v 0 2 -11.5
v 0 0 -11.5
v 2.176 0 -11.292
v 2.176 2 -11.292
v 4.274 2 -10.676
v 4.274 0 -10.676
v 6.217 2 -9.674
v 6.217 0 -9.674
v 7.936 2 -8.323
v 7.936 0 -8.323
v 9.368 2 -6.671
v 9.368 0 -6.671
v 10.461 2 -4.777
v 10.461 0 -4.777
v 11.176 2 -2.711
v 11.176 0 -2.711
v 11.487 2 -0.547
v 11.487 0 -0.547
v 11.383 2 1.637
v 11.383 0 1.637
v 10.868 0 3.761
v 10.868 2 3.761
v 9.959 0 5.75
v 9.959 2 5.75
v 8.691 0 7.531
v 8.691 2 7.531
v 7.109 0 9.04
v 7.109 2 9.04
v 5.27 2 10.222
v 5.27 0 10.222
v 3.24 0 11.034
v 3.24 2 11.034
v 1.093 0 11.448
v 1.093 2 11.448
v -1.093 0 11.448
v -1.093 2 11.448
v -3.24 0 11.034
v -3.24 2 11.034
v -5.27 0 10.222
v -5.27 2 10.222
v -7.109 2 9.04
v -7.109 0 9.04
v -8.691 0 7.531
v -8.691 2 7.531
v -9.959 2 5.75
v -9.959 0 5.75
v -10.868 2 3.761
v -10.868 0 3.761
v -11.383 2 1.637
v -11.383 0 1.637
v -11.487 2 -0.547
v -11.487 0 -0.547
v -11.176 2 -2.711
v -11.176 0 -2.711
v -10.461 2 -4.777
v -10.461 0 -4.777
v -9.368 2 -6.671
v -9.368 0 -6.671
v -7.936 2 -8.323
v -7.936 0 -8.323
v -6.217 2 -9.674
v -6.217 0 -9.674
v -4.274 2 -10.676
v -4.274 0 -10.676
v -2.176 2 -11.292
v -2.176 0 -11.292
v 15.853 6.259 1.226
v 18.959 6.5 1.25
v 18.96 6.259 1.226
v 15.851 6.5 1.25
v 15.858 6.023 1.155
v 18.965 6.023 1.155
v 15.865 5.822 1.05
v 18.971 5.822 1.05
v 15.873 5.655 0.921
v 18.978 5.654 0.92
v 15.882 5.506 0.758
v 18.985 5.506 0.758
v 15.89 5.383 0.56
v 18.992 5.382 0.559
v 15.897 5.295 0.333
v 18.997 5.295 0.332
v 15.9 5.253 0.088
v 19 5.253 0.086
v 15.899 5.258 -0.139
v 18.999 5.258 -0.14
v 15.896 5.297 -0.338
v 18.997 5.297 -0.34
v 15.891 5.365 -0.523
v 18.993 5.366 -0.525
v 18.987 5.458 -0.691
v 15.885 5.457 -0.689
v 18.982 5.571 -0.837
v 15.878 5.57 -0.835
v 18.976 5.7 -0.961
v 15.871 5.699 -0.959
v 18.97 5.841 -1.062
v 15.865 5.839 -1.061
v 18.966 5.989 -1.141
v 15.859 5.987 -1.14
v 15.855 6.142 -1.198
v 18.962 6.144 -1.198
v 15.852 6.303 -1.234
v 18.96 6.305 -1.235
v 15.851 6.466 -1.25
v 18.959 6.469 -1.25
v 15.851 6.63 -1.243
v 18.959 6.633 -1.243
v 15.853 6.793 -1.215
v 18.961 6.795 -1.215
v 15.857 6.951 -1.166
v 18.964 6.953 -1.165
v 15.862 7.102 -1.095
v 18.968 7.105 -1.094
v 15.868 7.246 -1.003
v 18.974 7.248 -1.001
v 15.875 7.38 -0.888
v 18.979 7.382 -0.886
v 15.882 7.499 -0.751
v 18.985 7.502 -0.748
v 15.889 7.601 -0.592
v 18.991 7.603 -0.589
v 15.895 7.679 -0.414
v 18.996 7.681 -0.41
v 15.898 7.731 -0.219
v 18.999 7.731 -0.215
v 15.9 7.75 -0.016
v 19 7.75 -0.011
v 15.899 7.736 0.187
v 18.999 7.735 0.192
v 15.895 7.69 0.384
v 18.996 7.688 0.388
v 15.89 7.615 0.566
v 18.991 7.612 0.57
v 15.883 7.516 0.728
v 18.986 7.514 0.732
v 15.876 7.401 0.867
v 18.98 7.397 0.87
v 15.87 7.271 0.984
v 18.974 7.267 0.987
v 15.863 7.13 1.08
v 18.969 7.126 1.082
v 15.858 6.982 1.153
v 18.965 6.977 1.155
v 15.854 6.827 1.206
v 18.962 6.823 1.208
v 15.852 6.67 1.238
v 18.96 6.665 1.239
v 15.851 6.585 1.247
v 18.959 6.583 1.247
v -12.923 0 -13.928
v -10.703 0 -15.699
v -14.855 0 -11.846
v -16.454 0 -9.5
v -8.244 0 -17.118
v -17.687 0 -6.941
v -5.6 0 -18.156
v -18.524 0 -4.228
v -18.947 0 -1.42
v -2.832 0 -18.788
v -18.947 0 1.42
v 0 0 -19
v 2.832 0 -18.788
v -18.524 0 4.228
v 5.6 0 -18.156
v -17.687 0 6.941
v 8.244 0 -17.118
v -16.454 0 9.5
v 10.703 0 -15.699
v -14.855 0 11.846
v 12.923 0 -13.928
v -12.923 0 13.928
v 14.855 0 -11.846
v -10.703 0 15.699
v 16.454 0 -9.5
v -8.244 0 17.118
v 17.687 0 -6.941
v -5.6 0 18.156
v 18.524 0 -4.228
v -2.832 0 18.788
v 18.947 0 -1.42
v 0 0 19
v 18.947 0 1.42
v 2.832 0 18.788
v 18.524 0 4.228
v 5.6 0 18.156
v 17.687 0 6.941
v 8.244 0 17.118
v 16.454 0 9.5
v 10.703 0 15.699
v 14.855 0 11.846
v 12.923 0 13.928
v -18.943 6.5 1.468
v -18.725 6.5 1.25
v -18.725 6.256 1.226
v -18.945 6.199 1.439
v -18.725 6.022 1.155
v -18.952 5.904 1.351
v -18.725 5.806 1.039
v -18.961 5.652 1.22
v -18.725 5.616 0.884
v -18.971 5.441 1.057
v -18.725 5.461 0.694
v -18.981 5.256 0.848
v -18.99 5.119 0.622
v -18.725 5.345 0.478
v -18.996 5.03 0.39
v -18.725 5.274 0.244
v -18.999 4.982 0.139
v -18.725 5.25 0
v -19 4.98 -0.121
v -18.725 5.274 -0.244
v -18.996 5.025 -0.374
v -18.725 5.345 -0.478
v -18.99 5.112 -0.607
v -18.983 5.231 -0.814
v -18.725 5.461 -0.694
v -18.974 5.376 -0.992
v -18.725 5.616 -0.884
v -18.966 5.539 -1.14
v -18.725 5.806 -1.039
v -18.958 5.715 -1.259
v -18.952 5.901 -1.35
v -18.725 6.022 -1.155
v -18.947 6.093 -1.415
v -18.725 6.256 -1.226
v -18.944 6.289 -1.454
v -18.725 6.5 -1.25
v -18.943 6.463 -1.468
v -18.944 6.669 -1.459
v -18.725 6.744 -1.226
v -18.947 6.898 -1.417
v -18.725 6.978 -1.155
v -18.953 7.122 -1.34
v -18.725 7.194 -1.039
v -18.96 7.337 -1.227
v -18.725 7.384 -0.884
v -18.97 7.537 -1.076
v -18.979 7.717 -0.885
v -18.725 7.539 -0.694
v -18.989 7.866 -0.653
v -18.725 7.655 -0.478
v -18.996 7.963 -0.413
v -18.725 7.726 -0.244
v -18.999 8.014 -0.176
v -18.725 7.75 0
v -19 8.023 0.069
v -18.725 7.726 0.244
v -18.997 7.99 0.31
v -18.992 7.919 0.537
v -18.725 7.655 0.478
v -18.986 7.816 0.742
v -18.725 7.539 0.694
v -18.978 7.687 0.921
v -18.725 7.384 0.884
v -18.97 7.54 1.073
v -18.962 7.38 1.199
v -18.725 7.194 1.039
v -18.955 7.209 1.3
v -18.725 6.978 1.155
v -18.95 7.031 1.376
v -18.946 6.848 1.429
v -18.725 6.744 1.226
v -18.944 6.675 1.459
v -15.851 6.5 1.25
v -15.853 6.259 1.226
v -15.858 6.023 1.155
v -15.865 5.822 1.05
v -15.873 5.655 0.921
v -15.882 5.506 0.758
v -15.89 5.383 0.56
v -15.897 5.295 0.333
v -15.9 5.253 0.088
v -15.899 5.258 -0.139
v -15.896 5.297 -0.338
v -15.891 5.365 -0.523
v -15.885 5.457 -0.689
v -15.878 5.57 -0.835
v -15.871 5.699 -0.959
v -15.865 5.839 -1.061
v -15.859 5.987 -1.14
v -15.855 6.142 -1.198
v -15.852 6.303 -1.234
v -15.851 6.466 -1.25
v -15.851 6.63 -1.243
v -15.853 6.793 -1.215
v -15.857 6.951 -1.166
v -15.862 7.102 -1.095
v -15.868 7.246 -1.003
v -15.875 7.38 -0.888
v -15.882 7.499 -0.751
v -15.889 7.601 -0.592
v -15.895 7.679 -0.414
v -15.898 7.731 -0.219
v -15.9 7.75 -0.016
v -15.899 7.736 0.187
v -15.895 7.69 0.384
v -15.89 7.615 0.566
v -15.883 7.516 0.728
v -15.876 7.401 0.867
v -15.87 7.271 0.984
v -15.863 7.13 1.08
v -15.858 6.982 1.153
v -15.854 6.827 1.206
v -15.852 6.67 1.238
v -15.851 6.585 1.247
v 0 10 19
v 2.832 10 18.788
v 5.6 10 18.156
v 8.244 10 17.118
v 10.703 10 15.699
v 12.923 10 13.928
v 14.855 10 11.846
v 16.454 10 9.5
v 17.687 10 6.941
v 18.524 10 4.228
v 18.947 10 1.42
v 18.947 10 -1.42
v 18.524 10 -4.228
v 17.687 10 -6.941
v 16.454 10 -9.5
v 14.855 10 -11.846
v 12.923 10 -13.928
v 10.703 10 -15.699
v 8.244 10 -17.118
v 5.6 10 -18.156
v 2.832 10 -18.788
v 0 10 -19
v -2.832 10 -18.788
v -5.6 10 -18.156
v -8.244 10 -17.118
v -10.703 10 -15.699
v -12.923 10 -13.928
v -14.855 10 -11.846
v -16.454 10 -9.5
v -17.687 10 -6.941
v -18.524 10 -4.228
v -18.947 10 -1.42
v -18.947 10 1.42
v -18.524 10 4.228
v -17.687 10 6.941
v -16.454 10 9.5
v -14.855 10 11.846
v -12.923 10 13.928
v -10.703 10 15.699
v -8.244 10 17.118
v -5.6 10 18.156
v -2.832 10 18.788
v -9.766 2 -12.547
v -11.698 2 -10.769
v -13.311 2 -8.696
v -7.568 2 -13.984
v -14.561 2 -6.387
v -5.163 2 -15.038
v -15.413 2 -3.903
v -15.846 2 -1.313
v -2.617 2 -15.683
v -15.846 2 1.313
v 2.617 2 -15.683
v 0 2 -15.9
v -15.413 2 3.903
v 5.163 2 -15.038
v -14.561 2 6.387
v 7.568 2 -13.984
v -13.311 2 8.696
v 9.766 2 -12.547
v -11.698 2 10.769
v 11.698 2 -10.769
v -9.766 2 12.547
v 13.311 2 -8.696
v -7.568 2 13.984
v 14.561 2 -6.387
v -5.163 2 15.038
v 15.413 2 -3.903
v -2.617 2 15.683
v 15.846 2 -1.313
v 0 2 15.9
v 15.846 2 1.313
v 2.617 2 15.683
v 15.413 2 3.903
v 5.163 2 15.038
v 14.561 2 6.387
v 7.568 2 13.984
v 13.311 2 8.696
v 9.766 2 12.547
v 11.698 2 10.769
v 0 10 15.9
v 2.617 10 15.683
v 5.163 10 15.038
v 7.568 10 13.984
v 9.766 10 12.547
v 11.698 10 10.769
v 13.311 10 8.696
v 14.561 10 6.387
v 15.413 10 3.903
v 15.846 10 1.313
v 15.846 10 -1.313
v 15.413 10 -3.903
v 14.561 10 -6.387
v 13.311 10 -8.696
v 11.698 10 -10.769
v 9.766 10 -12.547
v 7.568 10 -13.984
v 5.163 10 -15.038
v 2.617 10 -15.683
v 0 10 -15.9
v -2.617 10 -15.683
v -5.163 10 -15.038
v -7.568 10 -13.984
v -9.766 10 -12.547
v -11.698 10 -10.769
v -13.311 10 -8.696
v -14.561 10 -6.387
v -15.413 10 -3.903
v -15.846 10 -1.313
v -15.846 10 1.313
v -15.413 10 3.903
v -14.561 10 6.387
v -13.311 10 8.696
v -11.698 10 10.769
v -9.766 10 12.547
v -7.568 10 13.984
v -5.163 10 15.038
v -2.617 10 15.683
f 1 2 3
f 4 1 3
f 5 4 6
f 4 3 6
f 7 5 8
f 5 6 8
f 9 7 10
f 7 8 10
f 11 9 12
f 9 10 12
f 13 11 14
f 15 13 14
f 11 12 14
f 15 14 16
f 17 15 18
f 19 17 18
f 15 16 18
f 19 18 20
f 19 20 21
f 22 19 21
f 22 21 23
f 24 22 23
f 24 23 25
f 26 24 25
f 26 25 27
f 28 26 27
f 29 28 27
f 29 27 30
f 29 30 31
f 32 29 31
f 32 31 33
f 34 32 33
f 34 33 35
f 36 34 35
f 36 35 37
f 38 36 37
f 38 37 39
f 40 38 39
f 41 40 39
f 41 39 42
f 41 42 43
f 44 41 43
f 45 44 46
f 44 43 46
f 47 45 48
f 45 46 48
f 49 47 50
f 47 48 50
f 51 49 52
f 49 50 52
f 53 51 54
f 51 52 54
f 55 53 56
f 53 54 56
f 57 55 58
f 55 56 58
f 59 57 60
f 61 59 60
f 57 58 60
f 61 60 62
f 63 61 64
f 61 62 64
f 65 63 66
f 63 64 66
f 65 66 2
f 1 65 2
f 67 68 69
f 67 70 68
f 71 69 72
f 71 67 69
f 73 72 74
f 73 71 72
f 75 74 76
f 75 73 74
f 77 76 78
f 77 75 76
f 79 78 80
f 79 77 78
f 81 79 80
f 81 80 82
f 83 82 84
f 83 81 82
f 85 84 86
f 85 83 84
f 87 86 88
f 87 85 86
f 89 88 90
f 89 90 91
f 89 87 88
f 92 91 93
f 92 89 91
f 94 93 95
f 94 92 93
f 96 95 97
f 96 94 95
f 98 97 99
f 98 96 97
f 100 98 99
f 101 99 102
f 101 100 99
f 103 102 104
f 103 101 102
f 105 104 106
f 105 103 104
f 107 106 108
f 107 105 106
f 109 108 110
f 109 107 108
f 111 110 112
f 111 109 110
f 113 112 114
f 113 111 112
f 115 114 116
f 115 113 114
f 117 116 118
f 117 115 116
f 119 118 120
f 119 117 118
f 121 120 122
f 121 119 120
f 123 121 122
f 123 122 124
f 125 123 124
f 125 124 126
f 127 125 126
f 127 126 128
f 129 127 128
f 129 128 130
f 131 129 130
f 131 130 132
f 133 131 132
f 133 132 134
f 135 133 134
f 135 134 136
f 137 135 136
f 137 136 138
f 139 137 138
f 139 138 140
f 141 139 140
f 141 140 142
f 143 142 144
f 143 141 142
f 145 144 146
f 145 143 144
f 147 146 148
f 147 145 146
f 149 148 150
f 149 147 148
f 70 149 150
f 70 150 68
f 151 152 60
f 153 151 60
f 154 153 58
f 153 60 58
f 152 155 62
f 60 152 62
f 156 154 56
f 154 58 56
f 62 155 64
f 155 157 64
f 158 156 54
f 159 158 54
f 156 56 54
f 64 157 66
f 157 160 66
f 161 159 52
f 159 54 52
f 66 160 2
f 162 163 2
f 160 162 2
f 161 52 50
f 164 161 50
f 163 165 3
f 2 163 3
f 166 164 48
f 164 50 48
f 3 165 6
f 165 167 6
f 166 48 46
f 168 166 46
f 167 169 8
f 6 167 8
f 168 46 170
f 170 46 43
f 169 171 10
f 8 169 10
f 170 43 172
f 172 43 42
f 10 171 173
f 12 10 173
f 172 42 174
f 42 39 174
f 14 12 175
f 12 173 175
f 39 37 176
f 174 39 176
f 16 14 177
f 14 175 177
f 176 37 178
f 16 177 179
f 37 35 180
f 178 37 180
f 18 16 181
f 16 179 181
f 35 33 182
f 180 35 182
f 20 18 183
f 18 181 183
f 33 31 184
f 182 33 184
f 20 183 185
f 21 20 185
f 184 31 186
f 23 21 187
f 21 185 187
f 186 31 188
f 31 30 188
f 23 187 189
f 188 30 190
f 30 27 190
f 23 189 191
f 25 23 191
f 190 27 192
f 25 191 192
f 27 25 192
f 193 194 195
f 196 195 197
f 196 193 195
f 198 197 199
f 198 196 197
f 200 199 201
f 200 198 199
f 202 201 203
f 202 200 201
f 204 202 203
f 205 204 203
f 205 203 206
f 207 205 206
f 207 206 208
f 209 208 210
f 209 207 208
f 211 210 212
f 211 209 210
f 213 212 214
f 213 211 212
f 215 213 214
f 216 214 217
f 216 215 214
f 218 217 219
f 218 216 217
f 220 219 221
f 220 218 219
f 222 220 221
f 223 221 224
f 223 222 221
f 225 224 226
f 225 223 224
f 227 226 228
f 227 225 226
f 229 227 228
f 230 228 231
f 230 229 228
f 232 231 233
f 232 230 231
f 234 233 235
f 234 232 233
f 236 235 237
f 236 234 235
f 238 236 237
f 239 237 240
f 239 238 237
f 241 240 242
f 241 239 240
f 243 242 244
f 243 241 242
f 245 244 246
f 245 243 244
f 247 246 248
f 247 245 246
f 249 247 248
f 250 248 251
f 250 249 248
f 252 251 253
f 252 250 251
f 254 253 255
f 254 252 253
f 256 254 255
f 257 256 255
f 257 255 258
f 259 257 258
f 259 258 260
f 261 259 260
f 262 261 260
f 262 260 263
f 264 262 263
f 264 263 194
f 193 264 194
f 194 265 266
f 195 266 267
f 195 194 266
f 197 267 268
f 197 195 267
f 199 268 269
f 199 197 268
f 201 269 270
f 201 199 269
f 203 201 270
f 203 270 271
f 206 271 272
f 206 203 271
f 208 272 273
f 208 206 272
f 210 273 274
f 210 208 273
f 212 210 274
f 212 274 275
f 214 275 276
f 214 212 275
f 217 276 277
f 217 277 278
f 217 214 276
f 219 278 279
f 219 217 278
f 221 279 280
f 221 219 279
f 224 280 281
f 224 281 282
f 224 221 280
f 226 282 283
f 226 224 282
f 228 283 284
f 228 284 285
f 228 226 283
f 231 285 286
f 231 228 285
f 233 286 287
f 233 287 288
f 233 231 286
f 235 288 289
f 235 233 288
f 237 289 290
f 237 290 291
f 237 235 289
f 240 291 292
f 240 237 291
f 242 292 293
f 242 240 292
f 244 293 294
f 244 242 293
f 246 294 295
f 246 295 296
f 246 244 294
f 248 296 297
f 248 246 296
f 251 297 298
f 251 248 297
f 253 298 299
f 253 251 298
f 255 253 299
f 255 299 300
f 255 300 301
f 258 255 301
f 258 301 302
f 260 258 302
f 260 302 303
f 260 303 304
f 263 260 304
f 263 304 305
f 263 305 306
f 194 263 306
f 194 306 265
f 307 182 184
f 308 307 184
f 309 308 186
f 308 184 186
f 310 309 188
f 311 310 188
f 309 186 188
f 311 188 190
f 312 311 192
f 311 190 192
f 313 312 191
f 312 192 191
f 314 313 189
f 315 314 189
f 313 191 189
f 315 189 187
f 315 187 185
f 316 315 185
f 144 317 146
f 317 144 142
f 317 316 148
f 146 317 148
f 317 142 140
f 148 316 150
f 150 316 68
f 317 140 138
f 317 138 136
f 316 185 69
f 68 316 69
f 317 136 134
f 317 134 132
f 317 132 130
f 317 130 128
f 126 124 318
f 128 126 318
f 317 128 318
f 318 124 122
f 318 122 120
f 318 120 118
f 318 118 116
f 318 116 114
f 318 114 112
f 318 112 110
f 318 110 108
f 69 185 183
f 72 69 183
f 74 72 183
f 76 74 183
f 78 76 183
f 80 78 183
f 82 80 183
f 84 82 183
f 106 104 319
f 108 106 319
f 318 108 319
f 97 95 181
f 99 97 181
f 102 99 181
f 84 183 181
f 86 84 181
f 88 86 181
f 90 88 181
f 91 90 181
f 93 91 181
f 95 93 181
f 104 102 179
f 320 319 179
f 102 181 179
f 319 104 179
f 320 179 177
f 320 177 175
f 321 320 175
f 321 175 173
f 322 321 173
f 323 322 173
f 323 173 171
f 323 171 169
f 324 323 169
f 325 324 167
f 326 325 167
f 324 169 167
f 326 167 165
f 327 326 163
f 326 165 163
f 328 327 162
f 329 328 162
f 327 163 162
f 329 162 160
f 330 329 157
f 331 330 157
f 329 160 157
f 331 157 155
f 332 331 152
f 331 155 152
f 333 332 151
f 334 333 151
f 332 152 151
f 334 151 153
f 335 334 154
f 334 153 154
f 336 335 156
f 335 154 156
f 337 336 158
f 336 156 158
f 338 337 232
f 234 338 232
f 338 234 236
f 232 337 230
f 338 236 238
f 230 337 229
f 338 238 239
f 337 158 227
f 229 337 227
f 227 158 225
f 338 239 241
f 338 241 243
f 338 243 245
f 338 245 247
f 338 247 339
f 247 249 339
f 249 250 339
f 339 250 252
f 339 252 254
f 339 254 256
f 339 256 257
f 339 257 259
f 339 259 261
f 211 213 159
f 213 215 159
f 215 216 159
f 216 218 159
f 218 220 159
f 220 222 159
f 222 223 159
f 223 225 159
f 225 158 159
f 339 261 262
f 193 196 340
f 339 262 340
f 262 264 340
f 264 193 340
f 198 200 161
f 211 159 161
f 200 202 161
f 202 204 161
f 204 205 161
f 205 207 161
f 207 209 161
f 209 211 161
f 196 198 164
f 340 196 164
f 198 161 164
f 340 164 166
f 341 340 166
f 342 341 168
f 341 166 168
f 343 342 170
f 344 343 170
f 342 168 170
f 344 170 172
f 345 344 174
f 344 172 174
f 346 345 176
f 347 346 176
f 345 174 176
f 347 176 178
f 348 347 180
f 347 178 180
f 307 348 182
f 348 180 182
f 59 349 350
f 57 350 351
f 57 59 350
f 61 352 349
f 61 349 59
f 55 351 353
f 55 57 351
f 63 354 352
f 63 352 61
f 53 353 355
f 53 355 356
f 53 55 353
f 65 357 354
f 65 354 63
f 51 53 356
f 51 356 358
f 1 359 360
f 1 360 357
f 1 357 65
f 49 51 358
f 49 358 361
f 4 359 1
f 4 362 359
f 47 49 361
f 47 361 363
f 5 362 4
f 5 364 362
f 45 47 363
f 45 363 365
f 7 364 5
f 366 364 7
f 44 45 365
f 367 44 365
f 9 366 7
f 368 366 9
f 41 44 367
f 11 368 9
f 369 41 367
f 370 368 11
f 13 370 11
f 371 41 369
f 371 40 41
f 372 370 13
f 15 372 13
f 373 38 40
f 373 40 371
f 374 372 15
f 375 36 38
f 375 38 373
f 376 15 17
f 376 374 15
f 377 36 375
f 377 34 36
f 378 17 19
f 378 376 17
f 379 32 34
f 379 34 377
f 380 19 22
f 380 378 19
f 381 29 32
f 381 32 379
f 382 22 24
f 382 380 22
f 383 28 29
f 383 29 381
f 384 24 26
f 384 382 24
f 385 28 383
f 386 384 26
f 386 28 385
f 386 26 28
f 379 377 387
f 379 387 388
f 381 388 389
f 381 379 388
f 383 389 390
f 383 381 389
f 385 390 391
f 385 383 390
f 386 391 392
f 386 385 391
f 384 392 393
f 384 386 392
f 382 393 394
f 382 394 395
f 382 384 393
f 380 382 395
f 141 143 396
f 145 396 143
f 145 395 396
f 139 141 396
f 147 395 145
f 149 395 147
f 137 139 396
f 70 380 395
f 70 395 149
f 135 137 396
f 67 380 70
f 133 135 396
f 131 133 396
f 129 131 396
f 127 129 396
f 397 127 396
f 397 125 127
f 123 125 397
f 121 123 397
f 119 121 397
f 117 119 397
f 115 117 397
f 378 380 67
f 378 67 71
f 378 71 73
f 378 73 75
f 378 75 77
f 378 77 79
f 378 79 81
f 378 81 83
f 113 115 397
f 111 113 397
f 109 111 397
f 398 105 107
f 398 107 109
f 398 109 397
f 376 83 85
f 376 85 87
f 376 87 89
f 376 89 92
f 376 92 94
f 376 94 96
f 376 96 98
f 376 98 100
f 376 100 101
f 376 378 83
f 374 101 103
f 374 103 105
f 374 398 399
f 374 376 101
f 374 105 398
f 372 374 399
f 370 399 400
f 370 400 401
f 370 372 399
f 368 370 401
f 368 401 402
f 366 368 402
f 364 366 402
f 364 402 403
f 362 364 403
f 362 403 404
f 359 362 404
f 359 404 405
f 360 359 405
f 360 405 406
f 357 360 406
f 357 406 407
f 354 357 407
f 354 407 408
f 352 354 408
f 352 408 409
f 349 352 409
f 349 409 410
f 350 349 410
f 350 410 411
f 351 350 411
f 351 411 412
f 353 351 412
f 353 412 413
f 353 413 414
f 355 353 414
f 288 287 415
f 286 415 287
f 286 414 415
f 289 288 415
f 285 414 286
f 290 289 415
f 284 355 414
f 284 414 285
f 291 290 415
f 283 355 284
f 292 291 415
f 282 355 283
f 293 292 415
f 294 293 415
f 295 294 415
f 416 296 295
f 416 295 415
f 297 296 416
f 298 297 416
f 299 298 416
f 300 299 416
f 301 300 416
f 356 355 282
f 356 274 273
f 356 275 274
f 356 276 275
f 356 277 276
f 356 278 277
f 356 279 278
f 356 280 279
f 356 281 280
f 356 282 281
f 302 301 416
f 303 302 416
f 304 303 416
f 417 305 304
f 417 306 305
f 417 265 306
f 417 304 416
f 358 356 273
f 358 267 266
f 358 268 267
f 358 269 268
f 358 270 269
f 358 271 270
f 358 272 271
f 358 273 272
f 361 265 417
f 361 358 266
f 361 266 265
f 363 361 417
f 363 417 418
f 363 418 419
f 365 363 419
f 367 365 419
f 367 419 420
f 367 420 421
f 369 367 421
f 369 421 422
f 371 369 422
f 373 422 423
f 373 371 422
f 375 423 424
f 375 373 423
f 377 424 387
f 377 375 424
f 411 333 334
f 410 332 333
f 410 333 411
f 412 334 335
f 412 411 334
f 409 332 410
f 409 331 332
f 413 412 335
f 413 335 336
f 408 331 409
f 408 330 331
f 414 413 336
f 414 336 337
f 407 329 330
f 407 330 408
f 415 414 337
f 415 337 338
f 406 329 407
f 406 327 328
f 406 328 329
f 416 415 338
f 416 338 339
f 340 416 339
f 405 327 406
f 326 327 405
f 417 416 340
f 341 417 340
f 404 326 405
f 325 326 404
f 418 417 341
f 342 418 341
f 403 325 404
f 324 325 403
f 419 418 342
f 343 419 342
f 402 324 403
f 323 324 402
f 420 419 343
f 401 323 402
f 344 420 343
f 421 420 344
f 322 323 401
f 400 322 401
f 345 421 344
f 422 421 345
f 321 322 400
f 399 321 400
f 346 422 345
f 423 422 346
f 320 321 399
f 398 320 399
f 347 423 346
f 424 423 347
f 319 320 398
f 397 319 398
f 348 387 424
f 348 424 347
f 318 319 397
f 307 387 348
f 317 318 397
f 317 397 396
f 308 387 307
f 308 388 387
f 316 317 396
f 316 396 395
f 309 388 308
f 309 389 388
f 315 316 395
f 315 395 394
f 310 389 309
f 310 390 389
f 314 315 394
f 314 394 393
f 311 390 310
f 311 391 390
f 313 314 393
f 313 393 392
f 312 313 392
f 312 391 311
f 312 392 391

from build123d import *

# Parameters (mm, degrees)
SKETCH_1_R          = 19
EXTRUDE_1_DEPTH     = 2
SKETCH_2_R          = 19
SKETCH_2_R_2        = 15.9
EXTRUDE_2_DEPTH     = 8
SKETCH_3_R          = 11.5
CUT_EXTRUDE_1_DEPTH = 6


with BuildPart() as part:
    # 草图1 → 凸台-拉伸1 (new body)
    with BuildSketch(Plane(origin=(0, 0, 0), x_dir=(1, 0, 0), z_dir=(0, 1, 0))):
        with Locations(Location((0, 0, 0), (0, 0, 270))):
            Circle(SKETCH_1_R)
    extrude(amount=EXTRUDE_1_DEPTH)

    # 草图2 → 凸台-拉伸2 (add)
    with BuildSketch(Plane(origin=(0, 2, 0), x_dir=(1, 0, 0), z_dir=(0, 1, 0))):
        with Locations(Location((0, 0, 0), (0, 0, 270))):
            Circle(SKETCH_2_R)
        with Locations(Location((0, 0, 0), (0, 0, 270))):
            Circle(SKETCH_2_R_2, mode=Mode.SUBTRACT)
    extrude(amount=EXTRUDE_2_DEPTH)

    # 草图3 → 切除-拉伸1 (cut)
    with BuildSketch(Plane.XZ):
        with Locations(Location((0, 0, 0), (0, 0, 270))):
            Circle(SKETCH_3_R)
    extrude(amount=-CUT_EXTRUDE_1_DEPTH, mode=Mode.SUBTRACT)

    # 草图10 → M3 螺纹孔1 (revolve, cut)
    with BuildSketch(Plane(origin=(-19, 6.5, 0), x_dir=(0, 0, 1), z_dir=(0, 1, 0))):
        Polygon((0, 0), (0, 44.651075774), (1.25, 43.9), (1.25, 0.275), (1.525, 0), align=None)
    revolve(axis=Axis((-25.35, 6.5, 0), (1, 0, 0)), mode=Mode.SUBTRACT)


solid = part.part
